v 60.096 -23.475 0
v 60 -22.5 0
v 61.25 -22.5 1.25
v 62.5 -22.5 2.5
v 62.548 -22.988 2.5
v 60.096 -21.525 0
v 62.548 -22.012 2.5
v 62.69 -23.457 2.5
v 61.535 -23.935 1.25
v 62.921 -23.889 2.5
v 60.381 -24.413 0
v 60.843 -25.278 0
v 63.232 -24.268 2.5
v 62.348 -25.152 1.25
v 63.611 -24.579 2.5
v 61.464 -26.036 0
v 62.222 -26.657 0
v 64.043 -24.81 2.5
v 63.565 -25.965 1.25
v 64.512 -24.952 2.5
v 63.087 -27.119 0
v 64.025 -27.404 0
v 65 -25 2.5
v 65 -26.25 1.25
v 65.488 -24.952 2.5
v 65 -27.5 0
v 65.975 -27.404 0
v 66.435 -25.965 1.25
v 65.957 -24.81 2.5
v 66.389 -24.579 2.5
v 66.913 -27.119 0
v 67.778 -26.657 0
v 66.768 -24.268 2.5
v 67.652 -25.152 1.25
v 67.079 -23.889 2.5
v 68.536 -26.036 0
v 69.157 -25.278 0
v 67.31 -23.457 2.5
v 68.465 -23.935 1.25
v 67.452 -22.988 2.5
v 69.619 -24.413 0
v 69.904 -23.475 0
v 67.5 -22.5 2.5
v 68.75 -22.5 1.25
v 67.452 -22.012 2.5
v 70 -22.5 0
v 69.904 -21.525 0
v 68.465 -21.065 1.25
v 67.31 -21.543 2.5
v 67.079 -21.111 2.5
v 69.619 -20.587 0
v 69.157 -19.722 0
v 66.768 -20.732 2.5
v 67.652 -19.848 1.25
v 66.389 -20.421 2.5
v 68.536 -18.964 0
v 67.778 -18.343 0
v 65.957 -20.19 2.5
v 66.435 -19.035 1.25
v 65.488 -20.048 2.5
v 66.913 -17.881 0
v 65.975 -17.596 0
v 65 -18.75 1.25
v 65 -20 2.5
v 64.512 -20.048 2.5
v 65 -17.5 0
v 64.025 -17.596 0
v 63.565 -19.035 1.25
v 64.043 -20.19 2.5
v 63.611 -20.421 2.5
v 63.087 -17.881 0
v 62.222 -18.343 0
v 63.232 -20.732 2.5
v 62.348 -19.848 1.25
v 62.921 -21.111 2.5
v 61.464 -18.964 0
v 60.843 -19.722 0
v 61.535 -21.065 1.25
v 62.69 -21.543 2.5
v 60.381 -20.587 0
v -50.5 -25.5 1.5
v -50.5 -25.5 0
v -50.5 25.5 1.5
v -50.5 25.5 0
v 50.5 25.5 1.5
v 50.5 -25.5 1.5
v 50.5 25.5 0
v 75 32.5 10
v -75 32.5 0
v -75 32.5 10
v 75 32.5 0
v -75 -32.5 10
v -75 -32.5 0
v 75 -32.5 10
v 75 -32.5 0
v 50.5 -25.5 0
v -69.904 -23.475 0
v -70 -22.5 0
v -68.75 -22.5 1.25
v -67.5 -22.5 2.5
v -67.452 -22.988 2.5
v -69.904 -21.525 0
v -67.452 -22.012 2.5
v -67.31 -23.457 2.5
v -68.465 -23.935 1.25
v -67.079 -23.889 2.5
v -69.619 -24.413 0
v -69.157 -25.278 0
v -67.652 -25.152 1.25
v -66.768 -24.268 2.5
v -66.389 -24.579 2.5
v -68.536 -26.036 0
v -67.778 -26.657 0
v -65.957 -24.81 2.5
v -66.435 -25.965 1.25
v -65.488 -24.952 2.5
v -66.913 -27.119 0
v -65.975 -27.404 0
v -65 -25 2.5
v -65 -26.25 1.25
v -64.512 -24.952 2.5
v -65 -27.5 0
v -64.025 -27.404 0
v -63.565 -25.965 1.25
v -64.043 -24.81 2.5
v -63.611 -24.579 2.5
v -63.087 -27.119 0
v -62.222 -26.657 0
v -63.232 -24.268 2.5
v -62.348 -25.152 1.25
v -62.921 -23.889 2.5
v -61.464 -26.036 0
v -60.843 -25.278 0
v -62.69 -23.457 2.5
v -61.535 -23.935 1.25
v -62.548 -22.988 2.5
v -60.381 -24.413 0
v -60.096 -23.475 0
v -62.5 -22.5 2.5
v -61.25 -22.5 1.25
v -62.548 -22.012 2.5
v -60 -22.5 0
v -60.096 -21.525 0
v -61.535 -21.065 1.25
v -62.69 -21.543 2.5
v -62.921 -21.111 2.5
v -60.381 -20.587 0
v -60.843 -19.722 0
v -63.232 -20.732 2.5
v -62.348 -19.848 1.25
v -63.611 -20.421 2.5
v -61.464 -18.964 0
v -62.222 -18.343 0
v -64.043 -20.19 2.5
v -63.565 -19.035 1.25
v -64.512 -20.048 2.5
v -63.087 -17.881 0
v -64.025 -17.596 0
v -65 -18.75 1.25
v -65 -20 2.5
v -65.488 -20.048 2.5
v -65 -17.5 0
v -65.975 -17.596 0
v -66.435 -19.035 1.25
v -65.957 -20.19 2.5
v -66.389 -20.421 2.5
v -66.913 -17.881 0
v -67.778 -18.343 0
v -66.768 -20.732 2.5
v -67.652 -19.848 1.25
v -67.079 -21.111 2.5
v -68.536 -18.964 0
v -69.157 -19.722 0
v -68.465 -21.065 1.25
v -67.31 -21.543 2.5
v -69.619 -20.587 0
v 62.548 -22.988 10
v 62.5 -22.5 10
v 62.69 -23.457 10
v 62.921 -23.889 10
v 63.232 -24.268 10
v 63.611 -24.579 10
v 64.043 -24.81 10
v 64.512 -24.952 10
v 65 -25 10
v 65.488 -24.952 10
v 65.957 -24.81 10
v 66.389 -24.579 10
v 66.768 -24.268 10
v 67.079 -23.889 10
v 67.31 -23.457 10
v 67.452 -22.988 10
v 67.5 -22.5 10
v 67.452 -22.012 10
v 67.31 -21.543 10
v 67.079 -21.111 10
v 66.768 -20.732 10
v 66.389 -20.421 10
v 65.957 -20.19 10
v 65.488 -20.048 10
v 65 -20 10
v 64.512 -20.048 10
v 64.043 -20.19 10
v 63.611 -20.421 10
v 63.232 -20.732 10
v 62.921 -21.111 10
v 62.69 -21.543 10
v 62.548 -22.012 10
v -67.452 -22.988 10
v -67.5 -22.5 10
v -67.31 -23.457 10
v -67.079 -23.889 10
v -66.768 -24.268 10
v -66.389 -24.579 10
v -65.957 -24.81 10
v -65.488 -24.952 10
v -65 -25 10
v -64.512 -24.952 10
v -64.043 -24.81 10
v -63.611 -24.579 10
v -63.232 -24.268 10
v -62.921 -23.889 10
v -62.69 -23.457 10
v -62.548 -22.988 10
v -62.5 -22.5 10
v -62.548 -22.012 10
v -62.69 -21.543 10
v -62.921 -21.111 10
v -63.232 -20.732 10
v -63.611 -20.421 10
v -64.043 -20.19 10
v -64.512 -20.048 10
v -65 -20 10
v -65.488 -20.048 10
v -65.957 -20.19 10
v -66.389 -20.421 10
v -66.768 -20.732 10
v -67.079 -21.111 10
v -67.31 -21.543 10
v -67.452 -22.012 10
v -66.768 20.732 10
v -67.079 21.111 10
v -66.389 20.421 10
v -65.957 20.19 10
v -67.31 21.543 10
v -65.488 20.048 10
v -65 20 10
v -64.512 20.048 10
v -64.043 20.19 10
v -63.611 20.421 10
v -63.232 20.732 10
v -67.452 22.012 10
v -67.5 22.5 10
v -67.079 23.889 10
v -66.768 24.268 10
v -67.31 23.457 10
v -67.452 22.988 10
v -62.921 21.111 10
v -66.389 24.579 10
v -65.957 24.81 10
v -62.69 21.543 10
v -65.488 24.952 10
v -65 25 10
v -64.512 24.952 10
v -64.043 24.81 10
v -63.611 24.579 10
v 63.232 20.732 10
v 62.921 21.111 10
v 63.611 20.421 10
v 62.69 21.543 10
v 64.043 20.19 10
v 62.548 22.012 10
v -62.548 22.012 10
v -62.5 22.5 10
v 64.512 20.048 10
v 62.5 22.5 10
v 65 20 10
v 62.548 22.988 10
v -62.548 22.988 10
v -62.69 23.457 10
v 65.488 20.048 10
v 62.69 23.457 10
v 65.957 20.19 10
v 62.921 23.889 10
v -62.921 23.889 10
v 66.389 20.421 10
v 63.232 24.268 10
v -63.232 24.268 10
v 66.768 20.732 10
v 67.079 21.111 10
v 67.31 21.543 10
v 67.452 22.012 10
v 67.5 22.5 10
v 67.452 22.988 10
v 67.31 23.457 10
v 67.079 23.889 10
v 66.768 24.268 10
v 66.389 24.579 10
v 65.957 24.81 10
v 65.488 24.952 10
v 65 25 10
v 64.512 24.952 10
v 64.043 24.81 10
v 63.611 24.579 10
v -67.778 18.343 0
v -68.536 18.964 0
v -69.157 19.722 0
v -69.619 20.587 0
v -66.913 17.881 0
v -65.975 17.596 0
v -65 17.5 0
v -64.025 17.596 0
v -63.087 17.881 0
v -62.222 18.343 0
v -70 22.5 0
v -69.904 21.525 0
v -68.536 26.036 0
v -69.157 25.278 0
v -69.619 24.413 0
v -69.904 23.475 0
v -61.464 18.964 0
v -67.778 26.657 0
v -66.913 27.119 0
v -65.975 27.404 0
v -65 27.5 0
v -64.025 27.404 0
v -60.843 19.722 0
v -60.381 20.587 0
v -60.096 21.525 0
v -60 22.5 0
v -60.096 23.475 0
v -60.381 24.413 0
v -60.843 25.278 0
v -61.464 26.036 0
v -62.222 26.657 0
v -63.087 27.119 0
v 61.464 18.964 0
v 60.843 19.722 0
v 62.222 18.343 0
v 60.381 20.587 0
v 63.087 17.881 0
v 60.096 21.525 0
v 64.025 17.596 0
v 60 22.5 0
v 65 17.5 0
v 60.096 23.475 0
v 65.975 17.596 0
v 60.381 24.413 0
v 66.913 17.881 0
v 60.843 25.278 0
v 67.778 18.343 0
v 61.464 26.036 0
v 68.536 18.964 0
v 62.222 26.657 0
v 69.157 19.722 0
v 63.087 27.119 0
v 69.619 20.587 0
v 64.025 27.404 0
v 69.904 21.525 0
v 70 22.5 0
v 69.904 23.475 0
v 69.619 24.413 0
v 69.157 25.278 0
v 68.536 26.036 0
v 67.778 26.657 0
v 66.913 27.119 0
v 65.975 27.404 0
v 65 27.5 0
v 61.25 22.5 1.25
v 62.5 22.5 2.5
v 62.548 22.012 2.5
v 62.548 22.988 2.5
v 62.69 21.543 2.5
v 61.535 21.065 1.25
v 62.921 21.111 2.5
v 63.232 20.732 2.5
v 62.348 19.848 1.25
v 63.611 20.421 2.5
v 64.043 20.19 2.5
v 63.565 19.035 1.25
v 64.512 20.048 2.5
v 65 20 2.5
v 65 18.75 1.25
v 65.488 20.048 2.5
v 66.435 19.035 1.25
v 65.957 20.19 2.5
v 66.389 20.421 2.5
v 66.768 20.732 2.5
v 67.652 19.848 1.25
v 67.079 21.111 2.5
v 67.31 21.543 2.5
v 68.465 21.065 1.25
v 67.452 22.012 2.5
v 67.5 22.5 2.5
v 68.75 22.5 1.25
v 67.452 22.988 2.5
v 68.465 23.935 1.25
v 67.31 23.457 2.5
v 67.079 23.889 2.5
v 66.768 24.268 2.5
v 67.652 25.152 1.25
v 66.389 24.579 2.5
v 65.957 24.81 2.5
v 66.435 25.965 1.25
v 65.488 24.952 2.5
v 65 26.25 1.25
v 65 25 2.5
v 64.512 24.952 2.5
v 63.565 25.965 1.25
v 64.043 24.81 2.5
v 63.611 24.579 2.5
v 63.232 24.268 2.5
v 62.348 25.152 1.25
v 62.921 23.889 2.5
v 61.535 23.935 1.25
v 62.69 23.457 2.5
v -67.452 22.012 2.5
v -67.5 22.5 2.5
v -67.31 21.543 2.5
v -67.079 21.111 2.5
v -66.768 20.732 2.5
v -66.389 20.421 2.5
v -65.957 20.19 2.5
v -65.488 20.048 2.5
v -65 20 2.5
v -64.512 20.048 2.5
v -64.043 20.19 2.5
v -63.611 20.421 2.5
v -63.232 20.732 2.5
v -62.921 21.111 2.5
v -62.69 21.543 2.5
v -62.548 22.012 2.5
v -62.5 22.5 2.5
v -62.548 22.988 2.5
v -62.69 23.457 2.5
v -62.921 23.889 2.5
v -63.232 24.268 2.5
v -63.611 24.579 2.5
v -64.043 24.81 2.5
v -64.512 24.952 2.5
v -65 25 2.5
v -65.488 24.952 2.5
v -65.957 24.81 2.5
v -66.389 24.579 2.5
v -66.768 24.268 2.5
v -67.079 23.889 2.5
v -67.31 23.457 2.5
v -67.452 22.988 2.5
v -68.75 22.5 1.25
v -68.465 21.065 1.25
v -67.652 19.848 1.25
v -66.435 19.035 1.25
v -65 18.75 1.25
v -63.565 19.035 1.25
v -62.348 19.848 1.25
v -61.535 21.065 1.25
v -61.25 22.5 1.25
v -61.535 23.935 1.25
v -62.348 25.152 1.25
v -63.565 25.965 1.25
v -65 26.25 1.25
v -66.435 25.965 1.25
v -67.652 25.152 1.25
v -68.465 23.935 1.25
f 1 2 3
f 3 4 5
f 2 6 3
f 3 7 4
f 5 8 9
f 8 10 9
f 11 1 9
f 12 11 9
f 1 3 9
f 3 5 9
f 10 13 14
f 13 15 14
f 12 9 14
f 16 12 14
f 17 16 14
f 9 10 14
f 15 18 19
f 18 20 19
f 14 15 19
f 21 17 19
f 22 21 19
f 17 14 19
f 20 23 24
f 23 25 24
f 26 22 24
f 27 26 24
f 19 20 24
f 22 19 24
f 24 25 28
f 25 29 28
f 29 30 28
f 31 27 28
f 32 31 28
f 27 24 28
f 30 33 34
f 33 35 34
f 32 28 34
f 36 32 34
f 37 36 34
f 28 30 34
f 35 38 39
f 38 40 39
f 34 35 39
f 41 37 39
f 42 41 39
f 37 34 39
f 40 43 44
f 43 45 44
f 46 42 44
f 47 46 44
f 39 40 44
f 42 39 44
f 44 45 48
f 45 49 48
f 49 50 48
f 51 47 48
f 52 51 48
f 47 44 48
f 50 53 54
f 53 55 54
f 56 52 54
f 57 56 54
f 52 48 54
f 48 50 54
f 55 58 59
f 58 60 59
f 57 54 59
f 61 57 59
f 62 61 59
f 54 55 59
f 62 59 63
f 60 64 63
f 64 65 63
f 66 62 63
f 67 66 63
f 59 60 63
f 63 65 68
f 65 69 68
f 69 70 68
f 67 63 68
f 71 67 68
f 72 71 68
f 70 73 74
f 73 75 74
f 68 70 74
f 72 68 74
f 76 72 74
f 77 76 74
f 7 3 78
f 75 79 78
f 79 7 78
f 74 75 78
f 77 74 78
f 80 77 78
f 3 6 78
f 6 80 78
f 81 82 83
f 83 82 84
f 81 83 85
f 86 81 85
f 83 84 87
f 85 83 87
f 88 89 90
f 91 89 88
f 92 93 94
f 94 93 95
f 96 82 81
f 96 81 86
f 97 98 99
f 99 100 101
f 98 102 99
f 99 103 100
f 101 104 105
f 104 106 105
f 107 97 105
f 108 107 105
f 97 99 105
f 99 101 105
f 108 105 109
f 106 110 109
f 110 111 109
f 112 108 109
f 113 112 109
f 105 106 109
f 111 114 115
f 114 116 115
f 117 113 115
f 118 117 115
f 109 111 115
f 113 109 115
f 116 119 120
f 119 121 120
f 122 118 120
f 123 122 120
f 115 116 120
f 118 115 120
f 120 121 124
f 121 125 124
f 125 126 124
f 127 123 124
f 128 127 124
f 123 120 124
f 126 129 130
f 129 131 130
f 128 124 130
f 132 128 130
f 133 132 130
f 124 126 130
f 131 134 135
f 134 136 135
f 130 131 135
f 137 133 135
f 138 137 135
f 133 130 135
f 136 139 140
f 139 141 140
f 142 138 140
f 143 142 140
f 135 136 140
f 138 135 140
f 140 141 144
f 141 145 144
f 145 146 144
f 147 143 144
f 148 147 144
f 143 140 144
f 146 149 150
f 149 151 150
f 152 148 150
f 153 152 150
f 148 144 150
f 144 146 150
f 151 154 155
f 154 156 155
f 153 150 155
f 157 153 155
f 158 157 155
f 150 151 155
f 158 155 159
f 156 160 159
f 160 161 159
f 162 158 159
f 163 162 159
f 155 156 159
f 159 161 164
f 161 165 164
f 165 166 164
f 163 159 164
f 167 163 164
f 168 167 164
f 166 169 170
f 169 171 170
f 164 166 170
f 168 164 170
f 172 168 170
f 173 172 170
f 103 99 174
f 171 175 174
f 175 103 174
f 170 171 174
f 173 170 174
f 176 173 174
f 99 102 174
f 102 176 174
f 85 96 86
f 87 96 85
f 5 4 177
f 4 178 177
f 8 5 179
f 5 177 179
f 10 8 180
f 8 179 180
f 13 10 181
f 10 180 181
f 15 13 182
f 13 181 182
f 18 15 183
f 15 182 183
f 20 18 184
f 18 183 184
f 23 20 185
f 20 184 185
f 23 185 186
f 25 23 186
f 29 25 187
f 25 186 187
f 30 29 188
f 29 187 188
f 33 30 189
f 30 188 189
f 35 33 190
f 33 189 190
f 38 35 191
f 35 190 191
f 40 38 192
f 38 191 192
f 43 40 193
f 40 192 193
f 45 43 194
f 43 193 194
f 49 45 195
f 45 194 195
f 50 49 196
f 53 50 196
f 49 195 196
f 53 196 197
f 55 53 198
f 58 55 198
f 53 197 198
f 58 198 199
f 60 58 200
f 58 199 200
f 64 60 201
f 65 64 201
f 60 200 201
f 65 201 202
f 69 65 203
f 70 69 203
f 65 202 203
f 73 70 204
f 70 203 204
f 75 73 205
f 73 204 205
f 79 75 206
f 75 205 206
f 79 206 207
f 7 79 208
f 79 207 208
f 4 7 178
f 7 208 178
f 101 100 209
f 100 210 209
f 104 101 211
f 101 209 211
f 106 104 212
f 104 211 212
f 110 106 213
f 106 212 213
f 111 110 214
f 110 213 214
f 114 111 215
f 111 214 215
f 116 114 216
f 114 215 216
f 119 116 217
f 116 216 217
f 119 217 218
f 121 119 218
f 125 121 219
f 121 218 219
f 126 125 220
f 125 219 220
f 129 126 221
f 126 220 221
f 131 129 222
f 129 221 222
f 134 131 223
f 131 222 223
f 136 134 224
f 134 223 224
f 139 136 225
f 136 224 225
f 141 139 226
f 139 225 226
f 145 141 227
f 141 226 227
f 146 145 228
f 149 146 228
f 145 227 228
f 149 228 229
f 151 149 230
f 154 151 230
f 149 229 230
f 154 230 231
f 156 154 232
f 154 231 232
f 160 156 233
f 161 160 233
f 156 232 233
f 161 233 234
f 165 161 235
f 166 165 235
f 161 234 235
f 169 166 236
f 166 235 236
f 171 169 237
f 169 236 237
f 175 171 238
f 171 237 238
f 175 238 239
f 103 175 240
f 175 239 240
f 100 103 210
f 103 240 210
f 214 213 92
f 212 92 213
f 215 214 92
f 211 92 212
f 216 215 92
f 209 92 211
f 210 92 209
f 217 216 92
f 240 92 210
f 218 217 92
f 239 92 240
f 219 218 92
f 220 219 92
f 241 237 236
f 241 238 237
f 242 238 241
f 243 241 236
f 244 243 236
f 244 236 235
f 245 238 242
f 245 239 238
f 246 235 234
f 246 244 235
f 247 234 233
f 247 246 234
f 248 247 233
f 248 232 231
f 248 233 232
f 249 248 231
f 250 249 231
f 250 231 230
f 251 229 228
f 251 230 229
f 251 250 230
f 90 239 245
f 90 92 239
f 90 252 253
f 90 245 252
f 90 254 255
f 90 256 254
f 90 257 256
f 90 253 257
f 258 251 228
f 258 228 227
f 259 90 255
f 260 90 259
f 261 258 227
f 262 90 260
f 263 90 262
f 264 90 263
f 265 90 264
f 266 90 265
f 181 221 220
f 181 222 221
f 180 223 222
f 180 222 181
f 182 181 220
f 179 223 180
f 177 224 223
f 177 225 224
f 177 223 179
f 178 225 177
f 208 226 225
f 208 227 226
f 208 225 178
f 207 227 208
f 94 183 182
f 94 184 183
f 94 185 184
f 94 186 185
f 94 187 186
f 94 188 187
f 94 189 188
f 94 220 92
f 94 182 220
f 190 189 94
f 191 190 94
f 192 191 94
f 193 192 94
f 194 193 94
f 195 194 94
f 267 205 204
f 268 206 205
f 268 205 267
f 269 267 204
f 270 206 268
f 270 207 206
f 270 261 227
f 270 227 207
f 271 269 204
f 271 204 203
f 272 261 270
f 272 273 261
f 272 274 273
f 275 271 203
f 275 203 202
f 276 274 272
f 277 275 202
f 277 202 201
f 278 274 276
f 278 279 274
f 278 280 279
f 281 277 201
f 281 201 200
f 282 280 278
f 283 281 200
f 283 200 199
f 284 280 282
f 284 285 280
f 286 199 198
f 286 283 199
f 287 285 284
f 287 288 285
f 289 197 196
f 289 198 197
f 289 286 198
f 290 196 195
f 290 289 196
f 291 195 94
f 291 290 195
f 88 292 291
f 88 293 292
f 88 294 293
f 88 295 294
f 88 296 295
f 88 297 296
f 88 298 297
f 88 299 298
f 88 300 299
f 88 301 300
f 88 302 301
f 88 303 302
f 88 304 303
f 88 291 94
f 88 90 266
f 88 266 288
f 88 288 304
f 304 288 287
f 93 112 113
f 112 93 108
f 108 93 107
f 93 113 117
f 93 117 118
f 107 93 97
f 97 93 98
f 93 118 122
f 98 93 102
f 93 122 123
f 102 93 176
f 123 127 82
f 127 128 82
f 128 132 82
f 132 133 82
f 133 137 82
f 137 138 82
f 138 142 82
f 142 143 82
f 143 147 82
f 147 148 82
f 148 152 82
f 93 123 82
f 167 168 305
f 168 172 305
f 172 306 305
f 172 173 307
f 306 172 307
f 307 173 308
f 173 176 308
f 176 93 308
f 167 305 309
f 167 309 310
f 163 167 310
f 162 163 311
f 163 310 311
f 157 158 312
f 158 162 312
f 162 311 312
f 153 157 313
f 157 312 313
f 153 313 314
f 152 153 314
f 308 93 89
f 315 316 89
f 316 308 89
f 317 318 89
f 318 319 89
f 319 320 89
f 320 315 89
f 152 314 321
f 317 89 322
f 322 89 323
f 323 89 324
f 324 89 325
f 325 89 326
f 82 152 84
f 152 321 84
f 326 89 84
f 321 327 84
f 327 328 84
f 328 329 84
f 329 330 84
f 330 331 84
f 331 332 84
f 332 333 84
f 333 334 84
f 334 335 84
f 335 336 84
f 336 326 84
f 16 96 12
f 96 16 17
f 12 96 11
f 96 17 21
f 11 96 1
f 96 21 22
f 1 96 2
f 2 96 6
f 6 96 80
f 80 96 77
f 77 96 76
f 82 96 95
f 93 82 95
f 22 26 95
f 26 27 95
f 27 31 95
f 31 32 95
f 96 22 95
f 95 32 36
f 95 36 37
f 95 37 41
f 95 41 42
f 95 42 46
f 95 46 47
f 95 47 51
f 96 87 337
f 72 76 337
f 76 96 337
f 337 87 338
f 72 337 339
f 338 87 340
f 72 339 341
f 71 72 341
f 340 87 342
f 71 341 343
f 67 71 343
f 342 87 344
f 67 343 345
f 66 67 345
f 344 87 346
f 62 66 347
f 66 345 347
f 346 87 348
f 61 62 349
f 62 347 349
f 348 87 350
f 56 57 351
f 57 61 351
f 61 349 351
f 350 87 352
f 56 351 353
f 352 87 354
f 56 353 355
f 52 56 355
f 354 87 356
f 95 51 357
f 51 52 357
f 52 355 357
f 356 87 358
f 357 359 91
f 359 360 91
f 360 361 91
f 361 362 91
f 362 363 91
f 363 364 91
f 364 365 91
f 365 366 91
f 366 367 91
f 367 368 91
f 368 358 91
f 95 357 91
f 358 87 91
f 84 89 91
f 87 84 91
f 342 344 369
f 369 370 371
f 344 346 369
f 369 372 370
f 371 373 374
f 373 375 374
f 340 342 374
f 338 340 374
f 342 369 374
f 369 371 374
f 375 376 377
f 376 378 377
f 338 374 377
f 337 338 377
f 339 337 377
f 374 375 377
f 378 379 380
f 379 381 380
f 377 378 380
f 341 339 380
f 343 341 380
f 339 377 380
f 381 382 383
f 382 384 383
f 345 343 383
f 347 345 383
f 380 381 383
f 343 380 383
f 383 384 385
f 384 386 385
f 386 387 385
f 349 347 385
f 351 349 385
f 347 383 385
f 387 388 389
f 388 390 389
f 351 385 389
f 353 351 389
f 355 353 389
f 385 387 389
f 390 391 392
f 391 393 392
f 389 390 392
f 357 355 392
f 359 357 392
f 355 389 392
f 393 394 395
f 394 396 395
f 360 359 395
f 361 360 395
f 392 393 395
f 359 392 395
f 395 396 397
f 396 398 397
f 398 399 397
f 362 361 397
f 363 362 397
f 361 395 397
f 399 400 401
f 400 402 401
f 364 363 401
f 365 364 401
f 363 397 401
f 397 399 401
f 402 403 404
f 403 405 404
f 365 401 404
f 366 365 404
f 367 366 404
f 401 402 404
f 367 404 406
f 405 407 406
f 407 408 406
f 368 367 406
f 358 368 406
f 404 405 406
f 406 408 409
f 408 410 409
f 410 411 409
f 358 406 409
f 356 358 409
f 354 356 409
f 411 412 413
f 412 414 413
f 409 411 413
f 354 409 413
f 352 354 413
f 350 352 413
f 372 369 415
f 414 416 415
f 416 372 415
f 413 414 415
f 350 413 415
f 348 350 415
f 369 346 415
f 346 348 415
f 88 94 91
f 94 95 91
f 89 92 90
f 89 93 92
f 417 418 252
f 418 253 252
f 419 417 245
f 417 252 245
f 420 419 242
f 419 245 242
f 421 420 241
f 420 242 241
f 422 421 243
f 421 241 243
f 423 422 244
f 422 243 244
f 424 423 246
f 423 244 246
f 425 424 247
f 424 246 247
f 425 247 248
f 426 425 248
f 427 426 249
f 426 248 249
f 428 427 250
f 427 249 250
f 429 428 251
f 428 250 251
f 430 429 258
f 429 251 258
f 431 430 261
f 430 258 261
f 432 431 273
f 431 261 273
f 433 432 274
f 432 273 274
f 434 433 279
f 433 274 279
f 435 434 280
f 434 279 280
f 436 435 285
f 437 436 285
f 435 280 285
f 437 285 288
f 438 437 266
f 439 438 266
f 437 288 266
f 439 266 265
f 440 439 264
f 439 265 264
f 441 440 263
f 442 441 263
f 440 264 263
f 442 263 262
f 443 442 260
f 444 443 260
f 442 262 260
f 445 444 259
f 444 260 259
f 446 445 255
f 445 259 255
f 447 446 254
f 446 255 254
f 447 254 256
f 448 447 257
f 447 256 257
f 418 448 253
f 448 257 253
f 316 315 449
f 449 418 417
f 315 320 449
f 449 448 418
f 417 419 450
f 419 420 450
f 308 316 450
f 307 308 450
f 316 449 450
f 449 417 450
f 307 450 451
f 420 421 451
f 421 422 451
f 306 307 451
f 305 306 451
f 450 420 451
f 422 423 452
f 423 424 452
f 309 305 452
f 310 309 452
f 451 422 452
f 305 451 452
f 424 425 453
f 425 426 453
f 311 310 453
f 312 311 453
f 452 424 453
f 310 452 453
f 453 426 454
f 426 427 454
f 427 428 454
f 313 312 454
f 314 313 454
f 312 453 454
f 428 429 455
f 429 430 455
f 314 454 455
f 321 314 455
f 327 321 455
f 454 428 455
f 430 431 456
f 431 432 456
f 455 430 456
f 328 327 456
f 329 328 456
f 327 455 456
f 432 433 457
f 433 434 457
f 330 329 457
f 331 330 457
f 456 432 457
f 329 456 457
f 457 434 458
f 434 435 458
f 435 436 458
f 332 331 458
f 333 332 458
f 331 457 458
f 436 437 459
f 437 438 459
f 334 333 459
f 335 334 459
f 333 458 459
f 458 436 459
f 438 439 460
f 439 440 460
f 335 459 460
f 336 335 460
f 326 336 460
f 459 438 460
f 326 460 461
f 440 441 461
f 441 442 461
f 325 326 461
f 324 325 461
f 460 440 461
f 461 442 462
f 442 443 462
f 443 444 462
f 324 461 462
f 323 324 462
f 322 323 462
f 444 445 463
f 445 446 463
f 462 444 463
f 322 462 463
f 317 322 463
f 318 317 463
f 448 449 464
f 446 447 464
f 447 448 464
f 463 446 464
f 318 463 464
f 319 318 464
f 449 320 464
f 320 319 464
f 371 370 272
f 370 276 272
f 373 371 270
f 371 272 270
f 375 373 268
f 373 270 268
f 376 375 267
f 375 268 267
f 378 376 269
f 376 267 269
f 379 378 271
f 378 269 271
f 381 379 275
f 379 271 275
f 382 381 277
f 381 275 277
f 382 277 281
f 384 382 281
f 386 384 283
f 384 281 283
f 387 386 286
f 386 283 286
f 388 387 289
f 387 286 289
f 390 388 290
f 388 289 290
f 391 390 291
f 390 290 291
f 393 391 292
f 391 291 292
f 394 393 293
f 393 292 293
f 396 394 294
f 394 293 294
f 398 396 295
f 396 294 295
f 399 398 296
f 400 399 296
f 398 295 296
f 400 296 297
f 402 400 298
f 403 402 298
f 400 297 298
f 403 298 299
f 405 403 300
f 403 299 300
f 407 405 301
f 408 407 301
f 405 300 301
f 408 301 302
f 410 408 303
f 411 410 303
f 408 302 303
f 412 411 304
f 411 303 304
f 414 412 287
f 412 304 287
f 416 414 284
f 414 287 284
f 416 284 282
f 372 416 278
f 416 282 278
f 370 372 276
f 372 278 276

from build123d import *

# Parameters (mm, degrees)
SKETCH_W         = 150
SKETCH_H         = 65
SKETCH_W_2       = 101
SKETCH_H_2       = 51
PAD_DEPTH        = 1.5
SKETCH001_W      = 150
SKETCH001_H      = 65
PAD001_DEPTH     = 8.5
HOLE_D           = 5
HOLE_DEPTH       = 25
HOLE_CSINK_D     = 10
HOLE_CSINK_ANGLE = 90


with BuildPart() as part:
    # Sketch → Pad (new body)
    with BuildSketch(Plane.XY):
        Rectangle(SKETCH_W, SKETCH_H)
        Rectangle(SKETCH_W_2, SKETCH_H_2, mode=Mode.SUBTRACT)
    extrude(amount=PAD_DEPTH)

    # Sketch001 (on Face10 of Pad) → Pad001 (join)
    with BuildSketch(Plane.XY.offset(1.5)):
        Rectangle(SKETCH001_W, SKETCH001_H)
    extrude(amount=PAD001_DEPTH)

    # Hole
    with Locations(Plane(origin=(0, 0, 0), x_dir=(1, 0, 0), z_dir=(0, 0, -1))):
        with Locations((-65, 22.5), (-65, -22.5), (65, 22.5), (65, -22.5)):
            CounterSinkHole(HOLE_D / 2, HOLE_CSINK_D / 2, depth=HOLE_DEPTH, counter_sink_angle=HOLE_CSINK_ANGLE)


solid = part.part
